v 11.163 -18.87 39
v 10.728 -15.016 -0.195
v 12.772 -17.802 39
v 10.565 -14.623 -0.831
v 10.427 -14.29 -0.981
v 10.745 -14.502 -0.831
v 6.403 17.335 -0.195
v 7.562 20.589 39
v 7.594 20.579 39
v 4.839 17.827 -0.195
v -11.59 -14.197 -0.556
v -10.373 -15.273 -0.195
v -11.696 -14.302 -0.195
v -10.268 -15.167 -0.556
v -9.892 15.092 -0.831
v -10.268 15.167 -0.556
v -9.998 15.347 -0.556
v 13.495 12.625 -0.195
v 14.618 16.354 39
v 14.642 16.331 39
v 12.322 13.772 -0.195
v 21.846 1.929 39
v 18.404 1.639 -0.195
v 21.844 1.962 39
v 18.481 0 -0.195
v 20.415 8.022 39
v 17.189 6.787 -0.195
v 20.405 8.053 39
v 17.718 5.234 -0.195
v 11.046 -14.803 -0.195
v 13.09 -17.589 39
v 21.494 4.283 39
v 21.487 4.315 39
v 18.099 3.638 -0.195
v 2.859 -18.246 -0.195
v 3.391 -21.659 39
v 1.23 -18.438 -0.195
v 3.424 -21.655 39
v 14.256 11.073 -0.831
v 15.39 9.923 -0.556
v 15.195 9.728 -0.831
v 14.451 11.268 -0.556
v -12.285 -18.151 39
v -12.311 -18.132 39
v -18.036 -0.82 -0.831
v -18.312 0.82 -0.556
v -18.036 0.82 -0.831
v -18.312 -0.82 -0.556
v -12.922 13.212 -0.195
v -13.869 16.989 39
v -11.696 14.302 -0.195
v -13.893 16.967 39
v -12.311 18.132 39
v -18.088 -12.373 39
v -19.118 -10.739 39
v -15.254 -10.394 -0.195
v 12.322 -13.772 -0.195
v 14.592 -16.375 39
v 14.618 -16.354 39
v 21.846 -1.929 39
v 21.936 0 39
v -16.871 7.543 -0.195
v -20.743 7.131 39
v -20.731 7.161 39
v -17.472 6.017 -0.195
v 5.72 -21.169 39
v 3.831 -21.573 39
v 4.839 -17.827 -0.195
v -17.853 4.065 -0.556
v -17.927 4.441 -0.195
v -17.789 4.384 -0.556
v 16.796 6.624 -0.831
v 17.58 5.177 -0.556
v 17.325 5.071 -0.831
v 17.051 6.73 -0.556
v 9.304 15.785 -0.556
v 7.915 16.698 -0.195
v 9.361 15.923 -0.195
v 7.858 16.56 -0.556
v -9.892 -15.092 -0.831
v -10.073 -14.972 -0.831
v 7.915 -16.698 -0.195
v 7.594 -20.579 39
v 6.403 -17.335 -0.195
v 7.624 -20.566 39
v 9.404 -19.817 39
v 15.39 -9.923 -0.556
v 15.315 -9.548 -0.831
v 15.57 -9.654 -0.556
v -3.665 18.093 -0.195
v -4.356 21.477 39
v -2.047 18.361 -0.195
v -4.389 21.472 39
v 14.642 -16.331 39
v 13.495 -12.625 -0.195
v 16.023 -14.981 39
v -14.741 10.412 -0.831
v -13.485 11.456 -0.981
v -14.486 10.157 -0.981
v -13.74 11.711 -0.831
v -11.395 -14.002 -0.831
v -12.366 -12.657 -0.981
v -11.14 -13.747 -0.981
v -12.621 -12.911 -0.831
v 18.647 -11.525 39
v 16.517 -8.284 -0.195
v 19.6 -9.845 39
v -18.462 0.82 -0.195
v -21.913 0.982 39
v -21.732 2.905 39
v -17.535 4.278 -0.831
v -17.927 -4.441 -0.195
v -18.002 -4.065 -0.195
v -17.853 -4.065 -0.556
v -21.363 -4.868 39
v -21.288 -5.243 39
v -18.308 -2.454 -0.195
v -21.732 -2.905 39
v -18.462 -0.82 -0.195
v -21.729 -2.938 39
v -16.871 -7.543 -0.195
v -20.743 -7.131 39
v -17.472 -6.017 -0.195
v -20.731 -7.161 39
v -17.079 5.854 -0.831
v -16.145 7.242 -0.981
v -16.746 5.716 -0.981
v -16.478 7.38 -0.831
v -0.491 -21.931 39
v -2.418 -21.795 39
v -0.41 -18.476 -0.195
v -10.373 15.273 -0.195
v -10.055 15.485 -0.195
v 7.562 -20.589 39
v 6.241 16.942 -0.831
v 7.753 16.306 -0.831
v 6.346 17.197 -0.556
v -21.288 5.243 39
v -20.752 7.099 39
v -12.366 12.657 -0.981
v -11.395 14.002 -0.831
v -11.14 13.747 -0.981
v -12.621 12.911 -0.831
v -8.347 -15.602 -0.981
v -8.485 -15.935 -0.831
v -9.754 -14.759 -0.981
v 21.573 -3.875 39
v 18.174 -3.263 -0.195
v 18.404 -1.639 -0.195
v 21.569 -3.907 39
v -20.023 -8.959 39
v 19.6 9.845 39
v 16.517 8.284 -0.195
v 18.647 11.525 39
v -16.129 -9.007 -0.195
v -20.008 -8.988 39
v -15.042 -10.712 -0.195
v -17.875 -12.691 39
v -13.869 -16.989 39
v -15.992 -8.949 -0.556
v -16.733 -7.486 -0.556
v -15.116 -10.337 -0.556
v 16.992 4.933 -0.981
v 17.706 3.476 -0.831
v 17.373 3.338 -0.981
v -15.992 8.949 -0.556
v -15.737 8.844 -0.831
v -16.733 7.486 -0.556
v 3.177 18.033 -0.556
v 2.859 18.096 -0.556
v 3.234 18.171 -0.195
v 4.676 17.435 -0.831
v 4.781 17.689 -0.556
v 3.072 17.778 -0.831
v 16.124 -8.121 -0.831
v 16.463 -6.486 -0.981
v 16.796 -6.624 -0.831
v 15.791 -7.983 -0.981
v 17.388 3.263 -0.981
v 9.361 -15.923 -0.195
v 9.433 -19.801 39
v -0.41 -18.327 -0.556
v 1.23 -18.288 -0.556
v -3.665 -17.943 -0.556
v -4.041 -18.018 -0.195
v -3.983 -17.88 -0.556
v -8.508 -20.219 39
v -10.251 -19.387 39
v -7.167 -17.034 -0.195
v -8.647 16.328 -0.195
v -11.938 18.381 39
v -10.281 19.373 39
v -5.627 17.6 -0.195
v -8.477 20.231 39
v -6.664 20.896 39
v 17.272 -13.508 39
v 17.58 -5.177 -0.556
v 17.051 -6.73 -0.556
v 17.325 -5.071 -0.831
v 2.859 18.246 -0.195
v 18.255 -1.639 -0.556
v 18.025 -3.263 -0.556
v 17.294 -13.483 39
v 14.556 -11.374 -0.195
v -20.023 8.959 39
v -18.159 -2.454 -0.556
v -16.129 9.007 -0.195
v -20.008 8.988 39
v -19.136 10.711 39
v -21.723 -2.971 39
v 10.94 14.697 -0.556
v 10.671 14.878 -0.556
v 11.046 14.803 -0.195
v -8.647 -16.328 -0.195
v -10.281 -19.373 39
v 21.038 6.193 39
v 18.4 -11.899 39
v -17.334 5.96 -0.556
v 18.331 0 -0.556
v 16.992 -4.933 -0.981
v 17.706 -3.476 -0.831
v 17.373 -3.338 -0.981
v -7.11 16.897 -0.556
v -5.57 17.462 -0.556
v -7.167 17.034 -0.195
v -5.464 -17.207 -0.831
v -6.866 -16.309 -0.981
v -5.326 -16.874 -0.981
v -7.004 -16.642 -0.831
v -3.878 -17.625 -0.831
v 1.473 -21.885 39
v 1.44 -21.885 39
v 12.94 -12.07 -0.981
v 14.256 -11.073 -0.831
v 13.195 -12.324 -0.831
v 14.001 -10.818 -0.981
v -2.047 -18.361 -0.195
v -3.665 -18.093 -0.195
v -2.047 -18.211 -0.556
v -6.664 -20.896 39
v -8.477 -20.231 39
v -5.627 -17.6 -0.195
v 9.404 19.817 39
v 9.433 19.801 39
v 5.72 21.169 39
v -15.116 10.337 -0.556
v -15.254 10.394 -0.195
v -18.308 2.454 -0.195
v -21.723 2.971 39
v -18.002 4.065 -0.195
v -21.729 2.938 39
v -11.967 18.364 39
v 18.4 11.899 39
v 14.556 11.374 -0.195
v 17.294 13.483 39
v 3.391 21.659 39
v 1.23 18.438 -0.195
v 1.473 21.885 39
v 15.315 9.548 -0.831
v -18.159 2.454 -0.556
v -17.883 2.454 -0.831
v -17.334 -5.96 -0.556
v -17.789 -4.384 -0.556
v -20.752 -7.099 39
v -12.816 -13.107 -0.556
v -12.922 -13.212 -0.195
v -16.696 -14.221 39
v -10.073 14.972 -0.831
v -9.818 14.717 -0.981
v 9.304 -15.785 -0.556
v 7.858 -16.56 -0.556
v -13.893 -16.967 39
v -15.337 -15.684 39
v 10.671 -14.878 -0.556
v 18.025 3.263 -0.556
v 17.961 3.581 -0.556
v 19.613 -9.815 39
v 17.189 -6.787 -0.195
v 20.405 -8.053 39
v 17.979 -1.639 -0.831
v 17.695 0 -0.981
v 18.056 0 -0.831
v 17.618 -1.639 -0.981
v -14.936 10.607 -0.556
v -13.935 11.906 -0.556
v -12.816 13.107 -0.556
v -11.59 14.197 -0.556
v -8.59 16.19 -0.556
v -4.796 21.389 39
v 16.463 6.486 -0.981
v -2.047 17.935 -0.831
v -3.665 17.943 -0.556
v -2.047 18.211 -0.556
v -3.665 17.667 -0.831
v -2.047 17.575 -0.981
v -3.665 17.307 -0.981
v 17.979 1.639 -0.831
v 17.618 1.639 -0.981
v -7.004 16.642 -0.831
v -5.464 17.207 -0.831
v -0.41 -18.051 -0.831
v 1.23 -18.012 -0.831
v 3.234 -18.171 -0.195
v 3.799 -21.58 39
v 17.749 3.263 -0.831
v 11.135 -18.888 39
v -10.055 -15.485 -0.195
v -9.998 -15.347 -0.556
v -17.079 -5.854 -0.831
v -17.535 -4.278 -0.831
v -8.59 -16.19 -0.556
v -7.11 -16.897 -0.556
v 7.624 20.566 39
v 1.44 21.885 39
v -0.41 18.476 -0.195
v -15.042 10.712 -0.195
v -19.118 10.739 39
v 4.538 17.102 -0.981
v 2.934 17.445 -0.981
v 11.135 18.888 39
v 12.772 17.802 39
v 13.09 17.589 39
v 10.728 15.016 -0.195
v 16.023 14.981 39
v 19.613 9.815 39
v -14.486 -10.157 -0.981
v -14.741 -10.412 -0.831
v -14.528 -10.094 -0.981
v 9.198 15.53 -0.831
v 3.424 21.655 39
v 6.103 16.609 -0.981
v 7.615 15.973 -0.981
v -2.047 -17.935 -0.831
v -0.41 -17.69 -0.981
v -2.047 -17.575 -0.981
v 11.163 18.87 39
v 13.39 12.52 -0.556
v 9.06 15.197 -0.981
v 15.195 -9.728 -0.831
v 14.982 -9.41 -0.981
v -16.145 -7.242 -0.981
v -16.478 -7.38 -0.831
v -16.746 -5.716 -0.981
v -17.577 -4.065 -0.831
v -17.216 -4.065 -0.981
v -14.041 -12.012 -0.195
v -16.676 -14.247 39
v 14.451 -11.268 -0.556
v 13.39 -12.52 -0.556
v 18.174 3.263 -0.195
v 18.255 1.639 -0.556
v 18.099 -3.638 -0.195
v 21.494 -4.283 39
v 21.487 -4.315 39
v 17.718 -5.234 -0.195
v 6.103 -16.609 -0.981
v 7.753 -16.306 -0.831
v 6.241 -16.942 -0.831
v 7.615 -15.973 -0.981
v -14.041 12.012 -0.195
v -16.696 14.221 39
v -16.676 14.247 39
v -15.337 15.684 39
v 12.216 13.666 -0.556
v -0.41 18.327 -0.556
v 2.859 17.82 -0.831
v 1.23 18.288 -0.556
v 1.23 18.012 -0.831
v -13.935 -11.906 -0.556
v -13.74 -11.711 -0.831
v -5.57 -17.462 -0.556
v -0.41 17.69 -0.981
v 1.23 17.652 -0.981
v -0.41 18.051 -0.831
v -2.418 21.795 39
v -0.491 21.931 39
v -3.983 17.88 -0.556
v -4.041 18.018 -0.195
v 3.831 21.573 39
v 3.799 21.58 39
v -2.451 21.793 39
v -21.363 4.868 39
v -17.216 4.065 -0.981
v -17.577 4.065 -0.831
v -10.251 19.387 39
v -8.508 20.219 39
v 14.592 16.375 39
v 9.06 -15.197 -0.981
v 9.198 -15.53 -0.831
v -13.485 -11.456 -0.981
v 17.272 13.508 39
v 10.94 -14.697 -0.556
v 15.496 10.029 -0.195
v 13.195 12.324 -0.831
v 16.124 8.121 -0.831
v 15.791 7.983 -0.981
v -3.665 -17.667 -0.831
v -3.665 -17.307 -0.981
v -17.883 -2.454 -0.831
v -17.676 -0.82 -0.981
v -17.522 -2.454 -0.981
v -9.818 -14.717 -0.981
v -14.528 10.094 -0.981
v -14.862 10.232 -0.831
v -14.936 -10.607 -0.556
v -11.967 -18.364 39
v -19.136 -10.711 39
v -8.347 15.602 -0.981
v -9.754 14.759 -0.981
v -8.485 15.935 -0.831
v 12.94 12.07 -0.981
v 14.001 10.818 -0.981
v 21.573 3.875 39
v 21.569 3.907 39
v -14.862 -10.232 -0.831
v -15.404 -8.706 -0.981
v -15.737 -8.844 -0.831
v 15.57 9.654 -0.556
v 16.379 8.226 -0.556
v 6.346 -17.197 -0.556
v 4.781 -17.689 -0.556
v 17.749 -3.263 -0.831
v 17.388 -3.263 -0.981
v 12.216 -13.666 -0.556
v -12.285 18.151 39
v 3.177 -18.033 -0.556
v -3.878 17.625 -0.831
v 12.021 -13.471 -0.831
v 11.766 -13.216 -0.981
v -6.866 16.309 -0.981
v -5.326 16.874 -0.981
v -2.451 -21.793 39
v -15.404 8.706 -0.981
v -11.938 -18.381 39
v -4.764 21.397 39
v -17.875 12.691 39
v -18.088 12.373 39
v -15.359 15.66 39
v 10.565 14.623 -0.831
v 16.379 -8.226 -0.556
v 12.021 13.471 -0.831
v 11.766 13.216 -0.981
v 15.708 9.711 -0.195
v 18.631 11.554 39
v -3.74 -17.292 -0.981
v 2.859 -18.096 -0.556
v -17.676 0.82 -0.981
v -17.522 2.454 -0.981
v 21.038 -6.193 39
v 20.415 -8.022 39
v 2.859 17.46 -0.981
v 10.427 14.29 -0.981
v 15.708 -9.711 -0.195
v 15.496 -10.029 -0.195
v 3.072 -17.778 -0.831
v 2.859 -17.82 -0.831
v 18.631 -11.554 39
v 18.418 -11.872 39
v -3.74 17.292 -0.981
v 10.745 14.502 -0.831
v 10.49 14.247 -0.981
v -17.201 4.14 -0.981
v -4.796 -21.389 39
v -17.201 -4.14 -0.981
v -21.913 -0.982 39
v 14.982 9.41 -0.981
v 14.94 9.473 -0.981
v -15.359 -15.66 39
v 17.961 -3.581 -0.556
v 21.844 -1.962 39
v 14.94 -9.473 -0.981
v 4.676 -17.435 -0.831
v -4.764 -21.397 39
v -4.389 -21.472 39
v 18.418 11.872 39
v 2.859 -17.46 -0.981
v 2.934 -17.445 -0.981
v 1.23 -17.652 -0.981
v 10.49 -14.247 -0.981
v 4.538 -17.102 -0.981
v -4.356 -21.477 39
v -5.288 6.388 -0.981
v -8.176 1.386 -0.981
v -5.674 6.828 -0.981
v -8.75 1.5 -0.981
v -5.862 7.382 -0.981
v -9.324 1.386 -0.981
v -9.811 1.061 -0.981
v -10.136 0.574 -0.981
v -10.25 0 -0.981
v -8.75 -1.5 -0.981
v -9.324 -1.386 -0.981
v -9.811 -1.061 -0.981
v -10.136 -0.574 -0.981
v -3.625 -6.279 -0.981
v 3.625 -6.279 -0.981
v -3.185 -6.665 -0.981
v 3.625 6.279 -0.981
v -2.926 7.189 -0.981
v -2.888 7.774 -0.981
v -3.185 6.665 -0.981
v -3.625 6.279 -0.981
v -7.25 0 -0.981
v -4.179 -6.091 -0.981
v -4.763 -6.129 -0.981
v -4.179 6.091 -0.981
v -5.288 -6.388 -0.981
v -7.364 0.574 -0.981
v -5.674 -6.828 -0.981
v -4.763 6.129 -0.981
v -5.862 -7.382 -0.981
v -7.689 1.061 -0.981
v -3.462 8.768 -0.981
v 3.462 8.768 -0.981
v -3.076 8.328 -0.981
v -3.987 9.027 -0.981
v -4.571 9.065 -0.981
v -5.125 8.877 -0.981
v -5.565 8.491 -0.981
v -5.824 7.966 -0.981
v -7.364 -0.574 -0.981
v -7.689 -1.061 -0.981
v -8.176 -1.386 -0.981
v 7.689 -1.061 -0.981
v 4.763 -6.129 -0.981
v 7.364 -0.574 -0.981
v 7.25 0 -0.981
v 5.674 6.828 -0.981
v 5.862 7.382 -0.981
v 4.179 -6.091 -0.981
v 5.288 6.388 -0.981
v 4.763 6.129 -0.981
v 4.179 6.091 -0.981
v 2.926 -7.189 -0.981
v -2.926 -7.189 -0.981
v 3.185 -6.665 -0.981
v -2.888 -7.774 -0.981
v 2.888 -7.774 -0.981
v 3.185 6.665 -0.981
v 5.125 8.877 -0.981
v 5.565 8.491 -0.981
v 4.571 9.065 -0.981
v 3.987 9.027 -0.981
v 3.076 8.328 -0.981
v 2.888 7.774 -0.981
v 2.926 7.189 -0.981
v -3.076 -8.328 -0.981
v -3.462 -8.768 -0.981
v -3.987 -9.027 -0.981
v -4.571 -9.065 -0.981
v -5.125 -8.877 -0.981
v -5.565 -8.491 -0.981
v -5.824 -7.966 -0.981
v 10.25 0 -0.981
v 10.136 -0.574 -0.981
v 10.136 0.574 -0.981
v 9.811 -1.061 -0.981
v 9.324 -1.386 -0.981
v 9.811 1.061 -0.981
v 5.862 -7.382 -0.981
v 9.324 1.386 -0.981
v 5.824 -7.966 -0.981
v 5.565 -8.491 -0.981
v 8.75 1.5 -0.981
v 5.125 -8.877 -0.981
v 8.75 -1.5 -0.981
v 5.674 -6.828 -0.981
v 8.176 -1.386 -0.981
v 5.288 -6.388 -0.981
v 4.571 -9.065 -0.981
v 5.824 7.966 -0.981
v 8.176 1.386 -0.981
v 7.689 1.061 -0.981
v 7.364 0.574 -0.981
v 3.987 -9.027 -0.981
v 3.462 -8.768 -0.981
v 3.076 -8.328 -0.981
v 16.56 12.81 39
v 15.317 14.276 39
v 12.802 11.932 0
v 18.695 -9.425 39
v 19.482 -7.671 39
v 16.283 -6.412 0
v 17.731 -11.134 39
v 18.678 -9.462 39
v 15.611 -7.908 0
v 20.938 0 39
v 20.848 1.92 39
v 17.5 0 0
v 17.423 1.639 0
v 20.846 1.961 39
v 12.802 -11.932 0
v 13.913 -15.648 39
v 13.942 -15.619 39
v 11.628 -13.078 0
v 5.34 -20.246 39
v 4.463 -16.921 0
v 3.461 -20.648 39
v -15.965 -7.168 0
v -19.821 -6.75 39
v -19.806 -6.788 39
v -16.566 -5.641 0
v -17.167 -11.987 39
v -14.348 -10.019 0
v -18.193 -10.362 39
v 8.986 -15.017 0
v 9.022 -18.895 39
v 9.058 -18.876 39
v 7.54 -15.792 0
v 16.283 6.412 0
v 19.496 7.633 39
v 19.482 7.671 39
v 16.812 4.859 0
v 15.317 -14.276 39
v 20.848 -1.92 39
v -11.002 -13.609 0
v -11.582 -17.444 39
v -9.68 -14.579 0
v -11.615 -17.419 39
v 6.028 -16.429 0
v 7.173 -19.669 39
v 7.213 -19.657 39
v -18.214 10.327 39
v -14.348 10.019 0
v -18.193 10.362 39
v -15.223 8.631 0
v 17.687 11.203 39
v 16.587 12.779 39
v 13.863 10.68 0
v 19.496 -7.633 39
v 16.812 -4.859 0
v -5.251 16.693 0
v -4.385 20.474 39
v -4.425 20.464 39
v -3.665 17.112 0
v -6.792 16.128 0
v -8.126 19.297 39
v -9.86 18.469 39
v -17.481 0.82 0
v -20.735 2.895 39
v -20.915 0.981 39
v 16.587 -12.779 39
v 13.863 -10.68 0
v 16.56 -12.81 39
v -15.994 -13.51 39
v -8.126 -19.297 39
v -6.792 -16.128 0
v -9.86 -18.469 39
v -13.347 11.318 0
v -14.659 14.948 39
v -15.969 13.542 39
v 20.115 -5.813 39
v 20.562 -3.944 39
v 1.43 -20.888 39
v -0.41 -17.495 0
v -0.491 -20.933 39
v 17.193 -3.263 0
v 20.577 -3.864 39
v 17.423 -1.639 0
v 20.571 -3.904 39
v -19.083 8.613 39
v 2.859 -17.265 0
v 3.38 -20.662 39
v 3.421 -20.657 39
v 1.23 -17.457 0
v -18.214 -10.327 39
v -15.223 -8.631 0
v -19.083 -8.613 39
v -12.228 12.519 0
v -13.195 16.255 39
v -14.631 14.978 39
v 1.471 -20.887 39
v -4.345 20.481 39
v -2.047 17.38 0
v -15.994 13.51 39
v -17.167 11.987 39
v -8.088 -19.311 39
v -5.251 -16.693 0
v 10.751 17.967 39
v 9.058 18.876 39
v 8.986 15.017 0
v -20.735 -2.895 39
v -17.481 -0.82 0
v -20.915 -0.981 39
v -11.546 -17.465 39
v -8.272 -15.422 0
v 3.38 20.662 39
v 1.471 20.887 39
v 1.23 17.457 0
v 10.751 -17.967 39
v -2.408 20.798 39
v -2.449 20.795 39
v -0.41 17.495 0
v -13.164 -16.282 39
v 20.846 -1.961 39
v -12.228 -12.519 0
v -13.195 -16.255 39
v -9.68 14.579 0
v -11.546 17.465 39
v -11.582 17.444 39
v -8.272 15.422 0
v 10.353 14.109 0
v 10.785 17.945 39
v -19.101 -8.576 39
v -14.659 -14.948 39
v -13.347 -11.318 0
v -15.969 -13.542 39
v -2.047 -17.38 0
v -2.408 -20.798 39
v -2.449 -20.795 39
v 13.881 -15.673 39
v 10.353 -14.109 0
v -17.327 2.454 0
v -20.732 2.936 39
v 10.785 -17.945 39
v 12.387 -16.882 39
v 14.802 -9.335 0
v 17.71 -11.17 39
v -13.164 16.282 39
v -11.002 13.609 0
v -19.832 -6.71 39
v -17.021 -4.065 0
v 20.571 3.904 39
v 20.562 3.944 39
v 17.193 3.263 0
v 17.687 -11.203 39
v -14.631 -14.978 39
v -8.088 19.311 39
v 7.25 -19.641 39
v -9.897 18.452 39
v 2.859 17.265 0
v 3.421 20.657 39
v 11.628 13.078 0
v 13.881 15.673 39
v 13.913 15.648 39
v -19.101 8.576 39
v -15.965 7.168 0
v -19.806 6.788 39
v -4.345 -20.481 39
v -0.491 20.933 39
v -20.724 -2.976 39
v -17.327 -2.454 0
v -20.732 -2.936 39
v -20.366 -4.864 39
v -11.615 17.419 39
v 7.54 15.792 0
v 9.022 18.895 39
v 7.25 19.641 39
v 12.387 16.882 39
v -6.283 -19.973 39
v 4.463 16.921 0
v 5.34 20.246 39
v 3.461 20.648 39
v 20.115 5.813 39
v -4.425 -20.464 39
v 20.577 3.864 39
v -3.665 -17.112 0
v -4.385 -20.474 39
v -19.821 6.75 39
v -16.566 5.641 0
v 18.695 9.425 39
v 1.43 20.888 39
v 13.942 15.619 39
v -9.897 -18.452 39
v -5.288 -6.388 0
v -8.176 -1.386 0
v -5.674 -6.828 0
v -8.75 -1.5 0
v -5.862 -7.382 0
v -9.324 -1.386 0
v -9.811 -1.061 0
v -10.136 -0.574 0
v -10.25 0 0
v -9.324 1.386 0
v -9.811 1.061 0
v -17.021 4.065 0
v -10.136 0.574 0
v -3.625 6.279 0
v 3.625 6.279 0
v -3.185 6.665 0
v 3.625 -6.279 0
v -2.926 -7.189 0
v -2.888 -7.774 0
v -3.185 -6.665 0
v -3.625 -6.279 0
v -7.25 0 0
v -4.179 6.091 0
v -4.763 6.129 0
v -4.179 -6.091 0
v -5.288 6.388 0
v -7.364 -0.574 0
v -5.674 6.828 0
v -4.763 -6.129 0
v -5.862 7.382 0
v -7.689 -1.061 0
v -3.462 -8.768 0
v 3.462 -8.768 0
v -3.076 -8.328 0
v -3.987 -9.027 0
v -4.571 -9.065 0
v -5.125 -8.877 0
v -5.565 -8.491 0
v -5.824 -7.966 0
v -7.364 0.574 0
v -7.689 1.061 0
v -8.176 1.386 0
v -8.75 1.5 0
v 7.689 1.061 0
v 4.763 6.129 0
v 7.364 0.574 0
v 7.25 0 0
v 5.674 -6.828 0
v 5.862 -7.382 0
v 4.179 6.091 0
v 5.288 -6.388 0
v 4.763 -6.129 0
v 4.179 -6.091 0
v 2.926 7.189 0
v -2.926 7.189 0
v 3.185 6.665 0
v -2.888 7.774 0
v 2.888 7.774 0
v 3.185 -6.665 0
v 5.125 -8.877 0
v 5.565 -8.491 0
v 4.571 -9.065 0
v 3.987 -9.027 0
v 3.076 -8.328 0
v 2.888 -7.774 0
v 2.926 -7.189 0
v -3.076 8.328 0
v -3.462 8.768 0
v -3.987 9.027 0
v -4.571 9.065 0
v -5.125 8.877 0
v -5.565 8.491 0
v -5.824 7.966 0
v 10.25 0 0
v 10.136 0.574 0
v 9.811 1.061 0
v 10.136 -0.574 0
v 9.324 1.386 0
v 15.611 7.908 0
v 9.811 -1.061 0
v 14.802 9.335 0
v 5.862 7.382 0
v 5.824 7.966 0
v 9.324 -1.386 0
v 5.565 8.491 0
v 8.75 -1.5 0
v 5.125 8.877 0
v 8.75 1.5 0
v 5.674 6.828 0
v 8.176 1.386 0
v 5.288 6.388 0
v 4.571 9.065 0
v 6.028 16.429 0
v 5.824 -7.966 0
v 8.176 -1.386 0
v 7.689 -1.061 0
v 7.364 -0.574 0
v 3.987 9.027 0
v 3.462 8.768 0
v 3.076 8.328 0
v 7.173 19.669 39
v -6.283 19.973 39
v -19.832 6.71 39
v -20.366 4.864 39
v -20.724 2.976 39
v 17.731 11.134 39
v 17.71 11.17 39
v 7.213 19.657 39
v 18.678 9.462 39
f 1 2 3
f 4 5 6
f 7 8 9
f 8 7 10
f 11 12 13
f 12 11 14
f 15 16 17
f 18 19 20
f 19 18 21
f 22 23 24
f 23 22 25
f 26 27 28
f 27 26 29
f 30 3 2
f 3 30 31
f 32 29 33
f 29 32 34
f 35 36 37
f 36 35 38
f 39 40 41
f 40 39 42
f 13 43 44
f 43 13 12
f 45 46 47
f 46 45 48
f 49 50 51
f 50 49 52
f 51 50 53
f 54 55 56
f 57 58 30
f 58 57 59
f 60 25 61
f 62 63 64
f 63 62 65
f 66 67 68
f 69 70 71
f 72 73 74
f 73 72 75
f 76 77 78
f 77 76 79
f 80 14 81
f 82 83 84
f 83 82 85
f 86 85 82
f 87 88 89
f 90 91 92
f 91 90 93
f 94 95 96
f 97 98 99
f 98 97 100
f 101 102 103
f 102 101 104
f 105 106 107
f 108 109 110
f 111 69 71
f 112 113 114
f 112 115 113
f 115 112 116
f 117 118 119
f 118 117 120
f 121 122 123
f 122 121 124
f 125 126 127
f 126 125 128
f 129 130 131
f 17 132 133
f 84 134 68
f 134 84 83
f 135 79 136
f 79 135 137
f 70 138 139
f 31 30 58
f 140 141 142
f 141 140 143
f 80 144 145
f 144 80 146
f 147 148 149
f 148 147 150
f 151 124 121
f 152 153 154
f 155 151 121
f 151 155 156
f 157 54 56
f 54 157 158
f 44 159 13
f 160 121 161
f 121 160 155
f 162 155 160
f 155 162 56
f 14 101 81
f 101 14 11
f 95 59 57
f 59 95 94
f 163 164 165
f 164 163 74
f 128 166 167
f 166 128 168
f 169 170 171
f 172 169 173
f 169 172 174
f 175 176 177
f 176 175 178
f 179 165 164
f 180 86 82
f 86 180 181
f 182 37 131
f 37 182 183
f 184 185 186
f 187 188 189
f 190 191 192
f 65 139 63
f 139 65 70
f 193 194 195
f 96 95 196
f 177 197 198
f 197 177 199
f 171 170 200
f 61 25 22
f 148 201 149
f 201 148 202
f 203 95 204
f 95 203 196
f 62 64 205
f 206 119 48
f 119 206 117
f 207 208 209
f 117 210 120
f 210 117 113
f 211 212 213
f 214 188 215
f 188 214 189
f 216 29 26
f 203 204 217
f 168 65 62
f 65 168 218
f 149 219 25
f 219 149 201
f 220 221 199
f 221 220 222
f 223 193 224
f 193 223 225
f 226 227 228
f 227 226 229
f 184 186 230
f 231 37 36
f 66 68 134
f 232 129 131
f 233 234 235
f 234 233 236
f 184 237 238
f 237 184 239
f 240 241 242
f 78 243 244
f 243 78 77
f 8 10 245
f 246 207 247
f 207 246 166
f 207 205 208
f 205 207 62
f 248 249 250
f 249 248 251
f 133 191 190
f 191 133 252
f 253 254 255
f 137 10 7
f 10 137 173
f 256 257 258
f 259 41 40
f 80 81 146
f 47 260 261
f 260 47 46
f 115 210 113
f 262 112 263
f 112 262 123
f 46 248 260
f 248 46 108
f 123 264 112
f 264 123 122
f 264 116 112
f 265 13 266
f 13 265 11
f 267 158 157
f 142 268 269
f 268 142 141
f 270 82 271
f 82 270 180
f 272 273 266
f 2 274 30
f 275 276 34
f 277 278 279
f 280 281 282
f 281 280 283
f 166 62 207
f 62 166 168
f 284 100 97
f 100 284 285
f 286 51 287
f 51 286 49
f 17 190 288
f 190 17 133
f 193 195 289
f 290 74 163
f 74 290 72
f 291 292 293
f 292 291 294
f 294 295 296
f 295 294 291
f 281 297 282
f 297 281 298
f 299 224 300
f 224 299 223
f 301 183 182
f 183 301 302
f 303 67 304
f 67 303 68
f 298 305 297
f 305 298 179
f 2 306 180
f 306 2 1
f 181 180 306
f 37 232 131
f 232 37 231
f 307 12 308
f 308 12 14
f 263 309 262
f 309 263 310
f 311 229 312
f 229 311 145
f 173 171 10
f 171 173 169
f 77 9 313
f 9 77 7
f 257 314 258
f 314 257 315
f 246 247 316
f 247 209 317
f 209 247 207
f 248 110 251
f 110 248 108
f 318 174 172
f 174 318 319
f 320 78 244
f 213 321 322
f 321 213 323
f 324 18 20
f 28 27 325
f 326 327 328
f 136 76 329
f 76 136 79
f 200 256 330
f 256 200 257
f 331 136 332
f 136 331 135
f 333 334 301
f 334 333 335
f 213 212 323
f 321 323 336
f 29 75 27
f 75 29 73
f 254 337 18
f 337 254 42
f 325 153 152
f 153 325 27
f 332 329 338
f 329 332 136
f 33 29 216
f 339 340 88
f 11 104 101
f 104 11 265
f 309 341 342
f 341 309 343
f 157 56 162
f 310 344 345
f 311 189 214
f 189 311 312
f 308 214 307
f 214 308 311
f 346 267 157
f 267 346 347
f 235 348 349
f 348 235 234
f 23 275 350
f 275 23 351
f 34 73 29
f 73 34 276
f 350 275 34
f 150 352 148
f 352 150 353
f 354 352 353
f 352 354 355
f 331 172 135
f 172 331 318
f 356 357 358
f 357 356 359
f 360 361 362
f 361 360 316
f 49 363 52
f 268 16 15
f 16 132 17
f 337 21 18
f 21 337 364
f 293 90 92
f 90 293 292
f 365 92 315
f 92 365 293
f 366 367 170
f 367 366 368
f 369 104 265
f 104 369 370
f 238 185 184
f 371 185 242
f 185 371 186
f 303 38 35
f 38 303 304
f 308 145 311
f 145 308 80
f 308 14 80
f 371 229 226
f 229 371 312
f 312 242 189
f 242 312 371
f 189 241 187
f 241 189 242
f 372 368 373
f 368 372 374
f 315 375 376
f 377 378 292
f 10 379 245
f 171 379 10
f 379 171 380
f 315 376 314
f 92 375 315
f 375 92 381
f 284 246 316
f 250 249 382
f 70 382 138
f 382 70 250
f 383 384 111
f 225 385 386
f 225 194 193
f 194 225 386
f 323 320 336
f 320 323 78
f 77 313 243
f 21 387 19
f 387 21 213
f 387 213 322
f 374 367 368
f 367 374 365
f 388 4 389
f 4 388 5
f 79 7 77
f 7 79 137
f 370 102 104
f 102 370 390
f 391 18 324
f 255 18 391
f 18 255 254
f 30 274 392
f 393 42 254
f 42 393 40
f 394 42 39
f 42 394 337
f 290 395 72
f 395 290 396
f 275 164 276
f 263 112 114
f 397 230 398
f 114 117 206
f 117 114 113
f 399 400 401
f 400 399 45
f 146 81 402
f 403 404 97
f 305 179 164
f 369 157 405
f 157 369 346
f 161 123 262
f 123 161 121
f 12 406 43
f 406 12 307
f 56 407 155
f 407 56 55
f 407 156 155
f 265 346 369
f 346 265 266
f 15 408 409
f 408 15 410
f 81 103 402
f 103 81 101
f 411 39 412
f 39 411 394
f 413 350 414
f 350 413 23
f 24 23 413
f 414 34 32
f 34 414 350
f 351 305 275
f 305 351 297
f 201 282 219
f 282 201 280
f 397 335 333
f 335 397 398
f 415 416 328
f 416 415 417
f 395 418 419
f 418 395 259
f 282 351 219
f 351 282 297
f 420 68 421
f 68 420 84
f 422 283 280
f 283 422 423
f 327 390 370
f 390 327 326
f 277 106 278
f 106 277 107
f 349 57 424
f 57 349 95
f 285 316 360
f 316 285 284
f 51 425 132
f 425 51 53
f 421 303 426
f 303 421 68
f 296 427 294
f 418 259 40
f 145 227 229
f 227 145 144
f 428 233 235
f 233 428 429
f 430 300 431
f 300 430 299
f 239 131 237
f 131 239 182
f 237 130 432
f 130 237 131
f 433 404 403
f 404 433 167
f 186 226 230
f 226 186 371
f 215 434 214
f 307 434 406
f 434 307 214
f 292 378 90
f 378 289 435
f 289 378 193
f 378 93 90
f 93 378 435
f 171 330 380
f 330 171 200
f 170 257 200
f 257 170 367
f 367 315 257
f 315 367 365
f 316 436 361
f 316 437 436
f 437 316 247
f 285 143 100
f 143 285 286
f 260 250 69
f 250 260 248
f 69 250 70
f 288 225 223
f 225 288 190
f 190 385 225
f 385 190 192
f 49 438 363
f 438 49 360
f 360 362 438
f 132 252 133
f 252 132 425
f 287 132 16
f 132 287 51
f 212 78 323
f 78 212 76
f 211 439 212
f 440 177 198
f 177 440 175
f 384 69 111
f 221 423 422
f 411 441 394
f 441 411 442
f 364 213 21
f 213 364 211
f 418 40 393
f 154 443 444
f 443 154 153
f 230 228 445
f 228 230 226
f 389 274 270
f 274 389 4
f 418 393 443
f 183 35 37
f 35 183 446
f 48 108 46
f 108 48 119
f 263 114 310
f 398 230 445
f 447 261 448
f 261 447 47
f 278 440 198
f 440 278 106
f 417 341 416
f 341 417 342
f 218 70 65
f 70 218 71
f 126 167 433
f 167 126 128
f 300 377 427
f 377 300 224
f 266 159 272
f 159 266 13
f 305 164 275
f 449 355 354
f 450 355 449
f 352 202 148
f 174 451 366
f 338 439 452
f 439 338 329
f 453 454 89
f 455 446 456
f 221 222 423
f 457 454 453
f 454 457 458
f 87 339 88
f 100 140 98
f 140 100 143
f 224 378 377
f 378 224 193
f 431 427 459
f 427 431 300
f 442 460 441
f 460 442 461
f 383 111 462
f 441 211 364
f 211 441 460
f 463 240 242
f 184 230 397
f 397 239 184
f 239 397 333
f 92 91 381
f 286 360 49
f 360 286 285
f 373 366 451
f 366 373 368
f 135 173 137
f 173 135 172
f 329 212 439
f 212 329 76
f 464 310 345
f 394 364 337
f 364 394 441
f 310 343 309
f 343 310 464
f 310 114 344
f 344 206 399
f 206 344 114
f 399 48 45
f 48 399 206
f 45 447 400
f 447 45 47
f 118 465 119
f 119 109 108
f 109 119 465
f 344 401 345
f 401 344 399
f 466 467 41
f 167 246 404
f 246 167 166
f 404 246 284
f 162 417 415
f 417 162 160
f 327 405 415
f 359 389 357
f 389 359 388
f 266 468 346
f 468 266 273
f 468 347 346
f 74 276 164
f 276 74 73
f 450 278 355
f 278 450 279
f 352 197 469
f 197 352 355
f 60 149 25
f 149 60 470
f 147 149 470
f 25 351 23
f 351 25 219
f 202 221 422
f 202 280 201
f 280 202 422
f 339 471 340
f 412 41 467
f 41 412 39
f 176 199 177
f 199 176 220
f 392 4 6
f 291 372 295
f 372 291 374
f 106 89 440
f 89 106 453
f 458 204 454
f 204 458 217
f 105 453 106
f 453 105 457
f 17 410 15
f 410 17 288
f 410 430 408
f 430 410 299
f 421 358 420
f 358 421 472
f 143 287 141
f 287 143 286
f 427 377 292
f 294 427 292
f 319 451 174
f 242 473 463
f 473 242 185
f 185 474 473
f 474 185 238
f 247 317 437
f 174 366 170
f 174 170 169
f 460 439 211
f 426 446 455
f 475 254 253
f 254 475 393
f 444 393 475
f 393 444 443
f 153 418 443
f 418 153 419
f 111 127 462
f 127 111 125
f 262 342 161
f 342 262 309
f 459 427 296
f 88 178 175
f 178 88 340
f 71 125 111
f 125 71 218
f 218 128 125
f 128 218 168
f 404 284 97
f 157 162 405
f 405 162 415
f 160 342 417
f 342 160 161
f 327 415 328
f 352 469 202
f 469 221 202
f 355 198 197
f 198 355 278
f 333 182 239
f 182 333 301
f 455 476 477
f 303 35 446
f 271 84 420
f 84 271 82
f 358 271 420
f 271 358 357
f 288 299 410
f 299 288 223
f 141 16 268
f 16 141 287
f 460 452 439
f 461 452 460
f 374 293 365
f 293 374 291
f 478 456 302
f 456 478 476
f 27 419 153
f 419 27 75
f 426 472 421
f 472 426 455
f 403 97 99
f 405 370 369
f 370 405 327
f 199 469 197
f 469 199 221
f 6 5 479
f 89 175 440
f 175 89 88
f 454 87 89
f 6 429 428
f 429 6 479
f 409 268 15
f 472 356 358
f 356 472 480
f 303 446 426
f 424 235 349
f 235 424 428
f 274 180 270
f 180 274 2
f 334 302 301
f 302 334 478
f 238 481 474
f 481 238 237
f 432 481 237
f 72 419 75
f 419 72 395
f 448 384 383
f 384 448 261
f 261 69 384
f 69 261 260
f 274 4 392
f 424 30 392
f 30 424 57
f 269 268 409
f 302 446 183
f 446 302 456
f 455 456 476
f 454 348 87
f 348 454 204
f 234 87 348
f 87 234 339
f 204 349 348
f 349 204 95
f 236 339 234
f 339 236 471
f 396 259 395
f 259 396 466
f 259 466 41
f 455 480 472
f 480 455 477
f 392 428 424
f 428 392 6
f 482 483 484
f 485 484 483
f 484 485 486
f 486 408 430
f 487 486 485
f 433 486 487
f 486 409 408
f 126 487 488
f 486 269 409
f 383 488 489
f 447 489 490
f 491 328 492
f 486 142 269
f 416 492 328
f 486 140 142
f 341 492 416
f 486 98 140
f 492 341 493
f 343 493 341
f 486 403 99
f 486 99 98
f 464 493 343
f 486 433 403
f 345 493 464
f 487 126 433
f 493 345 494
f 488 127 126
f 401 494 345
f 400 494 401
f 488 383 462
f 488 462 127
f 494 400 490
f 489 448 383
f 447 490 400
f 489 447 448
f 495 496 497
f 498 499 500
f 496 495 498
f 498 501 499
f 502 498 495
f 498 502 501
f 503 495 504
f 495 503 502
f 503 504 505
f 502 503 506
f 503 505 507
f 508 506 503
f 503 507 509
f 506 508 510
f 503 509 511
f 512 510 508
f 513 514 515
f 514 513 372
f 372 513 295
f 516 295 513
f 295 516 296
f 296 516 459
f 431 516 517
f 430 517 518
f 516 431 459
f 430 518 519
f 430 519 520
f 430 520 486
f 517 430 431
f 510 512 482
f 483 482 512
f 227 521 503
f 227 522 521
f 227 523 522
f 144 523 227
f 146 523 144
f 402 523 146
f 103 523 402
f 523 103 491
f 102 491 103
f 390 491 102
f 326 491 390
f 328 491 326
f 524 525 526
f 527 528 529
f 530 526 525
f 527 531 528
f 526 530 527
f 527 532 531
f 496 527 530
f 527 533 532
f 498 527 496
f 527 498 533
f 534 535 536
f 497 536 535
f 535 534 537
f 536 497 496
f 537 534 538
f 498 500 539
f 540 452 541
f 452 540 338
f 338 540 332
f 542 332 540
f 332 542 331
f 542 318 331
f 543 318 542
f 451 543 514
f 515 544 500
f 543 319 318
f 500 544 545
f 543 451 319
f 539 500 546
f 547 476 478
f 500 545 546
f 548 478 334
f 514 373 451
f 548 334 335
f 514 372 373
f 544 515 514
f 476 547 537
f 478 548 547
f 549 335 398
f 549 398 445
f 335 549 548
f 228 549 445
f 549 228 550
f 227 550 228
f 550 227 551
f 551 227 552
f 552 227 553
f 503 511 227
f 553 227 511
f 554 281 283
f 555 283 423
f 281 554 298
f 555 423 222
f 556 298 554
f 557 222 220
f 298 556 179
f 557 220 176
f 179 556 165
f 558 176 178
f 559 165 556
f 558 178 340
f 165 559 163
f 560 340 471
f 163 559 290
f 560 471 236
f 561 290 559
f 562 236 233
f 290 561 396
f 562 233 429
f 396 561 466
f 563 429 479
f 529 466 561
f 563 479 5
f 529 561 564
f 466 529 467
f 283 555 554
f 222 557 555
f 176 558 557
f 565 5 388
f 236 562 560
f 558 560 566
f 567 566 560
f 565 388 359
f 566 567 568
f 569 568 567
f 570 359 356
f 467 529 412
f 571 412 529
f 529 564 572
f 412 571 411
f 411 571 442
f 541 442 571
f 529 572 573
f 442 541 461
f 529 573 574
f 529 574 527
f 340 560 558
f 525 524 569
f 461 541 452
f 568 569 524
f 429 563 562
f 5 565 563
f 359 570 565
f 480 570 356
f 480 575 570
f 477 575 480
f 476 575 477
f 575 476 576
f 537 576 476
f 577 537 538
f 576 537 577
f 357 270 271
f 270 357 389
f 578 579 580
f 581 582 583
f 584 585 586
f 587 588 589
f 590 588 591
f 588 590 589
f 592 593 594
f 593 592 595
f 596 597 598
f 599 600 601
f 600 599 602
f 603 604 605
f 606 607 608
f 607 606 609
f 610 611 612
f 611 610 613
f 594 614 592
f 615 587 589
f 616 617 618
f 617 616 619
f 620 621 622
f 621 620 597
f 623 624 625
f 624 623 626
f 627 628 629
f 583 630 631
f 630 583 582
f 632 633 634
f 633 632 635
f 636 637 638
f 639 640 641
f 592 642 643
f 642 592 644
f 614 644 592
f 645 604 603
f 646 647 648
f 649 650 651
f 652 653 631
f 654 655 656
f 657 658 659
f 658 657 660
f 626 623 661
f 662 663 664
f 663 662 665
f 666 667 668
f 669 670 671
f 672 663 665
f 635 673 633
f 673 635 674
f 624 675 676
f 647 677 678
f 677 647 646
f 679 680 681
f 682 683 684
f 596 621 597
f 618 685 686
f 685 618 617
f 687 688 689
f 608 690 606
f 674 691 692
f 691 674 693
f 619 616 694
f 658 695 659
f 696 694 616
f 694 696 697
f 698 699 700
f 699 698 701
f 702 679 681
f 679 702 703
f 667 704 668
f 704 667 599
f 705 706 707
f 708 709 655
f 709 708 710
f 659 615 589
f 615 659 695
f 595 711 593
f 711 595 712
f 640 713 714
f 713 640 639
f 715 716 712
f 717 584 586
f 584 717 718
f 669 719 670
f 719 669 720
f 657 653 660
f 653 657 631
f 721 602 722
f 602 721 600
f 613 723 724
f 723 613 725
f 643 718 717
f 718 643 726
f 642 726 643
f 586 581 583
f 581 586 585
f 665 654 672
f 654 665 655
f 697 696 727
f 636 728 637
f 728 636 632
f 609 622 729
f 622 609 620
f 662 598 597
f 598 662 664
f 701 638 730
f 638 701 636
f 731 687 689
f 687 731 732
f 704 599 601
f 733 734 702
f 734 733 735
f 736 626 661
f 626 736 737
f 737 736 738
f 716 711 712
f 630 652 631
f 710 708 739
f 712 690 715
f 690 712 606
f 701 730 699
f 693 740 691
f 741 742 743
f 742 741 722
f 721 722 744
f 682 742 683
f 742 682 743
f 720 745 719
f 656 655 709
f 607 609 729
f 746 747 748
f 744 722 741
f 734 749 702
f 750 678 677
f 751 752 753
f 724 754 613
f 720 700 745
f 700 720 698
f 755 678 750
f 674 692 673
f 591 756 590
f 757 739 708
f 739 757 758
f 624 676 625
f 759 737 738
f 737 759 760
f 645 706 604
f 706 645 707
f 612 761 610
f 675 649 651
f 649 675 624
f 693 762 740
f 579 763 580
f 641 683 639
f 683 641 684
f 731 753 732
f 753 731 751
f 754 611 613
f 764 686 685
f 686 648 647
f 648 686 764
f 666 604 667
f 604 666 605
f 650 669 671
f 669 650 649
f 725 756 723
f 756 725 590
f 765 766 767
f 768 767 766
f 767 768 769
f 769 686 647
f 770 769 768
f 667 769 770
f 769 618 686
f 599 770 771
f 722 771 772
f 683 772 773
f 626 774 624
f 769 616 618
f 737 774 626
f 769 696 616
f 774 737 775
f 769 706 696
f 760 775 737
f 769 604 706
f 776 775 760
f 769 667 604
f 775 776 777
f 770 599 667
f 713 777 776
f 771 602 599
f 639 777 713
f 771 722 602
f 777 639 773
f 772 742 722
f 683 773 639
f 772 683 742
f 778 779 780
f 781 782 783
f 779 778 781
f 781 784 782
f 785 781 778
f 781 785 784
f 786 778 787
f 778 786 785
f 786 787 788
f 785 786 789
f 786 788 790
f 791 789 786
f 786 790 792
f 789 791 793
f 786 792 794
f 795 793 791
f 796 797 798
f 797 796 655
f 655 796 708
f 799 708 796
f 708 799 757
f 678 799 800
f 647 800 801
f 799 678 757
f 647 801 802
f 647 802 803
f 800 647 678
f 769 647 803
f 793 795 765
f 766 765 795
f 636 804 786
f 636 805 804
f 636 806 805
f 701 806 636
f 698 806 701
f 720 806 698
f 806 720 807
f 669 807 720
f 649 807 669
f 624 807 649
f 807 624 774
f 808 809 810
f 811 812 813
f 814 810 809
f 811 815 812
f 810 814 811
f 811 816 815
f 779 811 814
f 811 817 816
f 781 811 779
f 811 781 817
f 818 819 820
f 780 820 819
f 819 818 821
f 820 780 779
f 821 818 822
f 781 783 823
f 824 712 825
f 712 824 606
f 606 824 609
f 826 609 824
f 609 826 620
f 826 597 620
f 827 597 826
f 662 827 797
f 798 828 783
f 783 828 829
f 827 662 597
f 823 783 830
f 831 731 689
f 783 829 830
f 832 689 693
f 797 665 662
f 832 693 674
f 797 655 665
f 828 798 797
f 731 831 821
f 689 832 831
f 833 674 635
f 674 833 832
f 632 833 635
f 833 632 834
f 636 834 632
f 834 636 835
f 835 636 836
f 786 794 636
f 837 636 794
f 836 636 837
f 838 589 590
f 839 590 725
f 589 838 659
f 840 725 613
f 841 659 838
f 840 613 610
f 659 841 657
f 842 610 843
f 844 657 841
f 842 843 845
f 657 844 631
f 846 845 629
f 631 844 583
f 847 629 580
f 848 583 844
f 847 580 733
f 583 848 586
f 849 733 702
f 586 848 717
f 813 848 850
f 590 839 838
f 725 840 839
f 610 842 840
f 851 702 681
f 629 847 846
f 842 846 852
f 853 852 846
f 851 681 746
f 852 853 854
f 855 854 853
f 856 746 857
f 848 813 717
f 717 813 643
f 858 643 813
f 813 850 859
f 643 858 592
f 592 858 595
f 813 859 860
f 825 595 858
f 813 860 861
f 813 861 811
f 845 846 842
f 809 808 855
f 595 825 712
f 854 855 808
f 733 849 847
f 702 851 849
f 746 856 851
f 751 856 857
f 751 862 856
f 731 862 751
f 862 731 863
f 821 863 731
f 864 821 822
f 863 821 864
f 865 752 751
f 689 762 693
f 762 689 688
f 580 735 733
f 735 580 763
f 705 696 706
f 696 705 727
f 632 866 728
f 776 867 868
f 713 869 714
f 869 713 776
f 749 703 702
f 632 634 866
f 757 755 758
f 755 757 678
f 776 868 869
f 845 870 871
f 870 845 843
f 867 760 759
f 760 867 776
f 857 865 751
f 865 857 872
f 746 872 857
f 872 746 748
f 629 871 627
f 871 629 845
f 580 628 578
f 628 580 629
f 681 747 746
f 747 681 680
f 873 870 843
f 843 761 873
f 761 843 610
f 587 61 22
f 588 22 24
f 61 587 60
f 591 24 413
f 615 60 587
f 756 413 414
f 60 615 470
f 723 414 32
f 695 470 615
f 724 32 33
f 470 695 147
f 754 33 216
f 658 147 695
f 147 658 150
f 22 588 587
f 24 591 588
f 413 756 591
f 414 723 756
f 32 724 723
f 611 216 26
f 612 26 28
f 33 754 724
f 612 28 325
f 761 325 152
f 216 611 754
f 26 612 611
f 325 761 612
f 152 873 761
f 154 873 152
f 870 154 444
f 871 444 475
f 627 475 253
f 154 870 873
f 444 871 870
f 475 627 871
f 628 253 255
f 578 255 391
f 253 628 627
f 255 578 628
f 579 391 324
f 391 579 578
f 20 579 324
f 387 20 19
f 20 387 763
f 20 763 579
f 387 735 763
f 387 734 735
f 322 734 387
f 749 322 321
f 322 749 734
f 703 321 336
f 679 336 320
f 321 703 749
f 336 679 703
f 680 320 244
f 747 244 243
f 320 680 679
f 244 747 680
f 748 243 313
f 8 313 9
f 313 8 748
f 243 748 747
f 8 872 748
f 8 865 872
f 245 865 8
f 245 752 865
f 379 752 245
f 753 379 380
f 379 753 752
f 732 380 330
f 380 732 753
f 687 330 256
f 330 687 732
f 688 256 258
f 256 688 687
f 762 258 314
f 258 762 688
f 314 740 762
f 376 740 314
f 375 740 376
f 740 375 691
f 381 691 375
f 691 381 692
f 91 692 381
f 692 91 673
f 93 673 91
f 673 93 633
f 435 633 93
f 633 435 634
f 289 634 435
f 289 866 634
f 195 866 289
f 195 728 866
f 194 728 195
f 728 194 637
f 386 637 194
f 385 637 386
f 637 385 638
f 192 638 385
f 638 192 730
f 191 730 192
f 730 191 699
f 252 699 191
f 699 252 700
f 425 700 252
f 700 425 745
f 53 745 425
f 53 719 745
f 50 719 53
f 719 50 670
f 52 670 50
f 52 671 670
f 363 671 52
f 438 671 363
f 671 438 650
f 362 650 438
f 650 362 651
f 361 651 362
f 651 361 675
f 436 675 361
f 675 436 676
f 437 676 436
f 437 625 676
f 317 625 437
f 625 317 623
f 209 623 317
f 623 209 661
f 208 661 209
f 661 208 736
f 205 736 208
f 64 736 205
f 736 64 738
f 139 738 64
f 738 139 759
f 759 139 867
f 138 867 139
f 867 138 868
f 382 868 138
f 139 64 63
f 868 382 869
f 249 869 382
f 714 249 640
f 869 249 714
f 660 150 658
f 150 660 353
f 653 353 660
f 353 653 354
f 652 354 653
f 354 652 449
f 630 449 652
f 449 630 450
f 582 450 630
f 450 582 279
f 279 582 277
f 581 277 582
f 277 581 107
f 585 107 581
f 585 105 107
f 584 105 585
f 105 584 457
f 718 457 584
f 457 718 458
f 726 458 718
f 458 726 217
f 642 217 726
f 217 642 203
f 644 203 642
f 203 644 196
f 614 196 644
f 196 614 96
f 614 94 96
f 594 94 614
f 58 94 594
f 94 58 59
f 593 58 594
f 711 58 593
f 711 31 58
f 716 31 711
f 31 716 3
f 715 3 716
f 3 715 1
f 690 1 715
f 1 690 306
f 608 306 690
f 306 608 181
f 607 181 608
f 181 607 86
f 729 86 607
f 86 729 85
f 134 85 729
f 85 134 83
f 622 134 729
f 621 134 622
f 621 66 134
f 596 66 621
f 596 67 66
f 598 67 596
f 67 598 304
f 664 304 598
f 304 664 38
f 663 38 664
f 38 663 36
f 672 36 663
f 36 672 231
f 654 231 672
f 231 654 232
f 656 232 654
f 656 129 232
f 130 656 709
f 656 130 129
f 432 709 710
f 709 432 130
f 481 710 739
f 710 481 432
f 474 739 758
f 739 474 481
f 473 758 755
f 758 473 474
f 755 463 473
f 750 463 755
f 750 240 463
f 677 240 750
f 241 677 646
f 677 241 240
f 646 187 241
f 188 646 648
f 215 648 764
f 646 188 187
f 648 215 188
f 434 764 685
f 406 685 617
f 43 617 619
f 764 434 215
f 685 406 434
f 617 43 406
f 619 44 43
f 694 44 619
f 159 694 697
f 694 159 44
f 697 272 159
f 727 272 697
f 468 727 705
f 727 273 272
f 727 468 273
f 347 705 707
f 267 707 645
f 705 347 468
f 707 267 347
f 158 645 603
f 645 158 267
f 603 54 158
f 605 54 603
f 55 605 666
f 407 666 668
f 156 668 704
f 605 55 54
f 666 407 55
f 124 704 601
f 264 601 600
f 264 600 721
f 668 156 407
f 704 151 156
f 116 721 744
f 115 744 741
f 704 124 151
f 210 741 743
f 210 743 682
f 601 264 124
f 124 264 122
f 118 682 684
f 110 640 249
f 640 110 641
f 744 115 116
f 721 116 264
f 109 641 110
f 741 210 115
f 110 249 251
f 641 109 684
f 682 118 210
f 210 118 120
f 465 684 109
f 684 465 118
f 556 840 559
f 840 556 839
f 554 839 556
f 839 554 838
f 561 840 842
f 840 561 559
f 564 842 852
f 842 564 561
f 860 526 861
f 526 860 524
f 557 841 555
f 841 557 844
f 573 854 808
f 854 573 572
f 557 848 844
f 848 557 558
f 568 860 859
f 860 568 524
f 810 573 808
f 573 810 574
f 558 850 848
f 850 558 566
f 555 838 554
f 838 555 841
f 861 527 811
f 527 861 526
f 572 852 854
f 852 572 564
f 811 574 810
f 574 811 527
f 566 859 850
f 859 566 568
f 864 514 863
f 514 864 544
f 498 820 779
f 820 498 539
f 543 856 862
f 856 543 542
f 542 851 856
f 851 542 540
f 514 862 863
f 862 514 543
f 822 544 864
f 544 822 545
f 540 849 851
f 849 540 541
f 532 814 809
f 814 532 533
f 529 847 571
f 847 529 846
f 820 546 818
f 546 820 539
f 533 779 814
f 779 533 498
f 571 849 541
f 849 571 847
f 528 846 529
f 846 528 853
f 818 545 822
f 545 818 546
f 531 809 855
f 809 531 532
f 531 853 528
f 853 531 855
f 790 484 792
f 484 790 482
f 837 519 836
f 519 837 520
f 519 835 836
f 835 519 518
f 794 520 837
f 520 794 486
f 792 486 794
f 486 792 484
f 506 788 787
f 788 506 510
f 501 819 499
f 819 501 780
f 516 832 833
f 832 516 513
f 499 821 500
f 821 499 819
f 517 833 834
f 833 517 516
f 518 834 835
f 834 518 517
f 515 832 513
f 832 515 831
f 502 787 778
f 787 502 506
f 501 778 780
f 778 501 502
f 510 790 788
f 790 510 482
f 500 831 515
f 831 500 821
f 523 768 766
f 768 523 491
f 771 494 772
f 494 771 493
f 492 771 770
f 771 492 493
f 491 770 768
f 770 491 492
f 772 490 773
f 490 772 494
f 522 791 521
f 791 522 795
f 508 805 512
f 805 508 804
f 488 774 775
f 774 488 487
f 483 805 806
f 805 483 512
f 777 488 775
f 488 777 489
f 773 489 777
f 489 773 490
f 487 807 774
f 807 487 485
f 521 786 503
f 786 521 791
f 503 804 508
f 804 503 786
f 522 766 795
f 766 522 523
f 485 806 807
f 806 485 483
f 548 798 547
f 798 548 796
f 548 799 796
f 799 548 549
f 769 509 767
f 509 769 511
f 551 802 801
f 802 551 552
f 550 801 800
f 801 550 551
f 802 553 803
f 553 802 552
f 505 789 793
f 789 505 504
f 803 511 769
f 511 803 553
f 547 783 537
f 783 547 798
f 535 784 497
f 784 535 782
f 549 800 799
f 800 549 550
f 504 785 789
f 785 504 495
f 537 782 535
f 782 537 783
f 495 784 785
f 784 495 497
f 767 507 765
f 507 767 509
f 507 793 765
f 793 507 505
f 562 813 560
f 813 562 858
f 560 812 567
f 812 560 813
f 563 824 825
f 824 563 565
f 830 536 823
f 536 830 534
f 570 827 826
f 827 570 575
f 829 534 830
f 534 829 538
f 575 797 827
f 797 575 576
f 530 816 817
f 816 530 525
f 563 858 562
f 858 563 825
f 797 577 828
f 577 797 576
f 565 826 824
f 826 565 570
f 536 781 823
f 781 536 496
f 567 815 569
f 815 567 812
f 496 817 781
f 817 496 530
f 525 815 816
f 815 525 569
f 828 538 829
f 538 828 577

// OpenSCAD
//simple plant pot

//Diameter of base in mm
baseD = 35;

//Height of pot in mm
potH = 40;

// The sides are this many degrees from verticle
sideSlope = 10; //[0:1:90]

//Thickness of the pot size
potThick = 1;


/* [Holes in Base] */

// Number of holes
nHoles = 6;//[0:1:10]

// Size of Holes diameter in mm
sHoles = 3;//


difference() {
    pot();
    holes(nHoles, sHoles);
}

// preview[view:south, tilt:top]

module holes(n, s){
    for(i = [0:n]){
        rotate([0,0,i*360/n]) translate([baseD/4,0,0]) cylinder(d=s, h=2*potThick, center=true, $fn=16);
    }
}

module pot(){
difference(){
minkowski(){    
cylinder(d1=baseD, d2=baseD+potH*tan(sideSlope) , h=potH, $fa=3);
sphere(r=potThick, $fn=16);
}//!minkowski
cylinder(d1=baseD, d2=baseD+potH*tan(sideSlope) , h=potH, $fa=3);
//slice top off
translate([0,0,potH]) cylinder(d=2*baseD, h= 2*potThick, center=true);

    
}//!diff
}
